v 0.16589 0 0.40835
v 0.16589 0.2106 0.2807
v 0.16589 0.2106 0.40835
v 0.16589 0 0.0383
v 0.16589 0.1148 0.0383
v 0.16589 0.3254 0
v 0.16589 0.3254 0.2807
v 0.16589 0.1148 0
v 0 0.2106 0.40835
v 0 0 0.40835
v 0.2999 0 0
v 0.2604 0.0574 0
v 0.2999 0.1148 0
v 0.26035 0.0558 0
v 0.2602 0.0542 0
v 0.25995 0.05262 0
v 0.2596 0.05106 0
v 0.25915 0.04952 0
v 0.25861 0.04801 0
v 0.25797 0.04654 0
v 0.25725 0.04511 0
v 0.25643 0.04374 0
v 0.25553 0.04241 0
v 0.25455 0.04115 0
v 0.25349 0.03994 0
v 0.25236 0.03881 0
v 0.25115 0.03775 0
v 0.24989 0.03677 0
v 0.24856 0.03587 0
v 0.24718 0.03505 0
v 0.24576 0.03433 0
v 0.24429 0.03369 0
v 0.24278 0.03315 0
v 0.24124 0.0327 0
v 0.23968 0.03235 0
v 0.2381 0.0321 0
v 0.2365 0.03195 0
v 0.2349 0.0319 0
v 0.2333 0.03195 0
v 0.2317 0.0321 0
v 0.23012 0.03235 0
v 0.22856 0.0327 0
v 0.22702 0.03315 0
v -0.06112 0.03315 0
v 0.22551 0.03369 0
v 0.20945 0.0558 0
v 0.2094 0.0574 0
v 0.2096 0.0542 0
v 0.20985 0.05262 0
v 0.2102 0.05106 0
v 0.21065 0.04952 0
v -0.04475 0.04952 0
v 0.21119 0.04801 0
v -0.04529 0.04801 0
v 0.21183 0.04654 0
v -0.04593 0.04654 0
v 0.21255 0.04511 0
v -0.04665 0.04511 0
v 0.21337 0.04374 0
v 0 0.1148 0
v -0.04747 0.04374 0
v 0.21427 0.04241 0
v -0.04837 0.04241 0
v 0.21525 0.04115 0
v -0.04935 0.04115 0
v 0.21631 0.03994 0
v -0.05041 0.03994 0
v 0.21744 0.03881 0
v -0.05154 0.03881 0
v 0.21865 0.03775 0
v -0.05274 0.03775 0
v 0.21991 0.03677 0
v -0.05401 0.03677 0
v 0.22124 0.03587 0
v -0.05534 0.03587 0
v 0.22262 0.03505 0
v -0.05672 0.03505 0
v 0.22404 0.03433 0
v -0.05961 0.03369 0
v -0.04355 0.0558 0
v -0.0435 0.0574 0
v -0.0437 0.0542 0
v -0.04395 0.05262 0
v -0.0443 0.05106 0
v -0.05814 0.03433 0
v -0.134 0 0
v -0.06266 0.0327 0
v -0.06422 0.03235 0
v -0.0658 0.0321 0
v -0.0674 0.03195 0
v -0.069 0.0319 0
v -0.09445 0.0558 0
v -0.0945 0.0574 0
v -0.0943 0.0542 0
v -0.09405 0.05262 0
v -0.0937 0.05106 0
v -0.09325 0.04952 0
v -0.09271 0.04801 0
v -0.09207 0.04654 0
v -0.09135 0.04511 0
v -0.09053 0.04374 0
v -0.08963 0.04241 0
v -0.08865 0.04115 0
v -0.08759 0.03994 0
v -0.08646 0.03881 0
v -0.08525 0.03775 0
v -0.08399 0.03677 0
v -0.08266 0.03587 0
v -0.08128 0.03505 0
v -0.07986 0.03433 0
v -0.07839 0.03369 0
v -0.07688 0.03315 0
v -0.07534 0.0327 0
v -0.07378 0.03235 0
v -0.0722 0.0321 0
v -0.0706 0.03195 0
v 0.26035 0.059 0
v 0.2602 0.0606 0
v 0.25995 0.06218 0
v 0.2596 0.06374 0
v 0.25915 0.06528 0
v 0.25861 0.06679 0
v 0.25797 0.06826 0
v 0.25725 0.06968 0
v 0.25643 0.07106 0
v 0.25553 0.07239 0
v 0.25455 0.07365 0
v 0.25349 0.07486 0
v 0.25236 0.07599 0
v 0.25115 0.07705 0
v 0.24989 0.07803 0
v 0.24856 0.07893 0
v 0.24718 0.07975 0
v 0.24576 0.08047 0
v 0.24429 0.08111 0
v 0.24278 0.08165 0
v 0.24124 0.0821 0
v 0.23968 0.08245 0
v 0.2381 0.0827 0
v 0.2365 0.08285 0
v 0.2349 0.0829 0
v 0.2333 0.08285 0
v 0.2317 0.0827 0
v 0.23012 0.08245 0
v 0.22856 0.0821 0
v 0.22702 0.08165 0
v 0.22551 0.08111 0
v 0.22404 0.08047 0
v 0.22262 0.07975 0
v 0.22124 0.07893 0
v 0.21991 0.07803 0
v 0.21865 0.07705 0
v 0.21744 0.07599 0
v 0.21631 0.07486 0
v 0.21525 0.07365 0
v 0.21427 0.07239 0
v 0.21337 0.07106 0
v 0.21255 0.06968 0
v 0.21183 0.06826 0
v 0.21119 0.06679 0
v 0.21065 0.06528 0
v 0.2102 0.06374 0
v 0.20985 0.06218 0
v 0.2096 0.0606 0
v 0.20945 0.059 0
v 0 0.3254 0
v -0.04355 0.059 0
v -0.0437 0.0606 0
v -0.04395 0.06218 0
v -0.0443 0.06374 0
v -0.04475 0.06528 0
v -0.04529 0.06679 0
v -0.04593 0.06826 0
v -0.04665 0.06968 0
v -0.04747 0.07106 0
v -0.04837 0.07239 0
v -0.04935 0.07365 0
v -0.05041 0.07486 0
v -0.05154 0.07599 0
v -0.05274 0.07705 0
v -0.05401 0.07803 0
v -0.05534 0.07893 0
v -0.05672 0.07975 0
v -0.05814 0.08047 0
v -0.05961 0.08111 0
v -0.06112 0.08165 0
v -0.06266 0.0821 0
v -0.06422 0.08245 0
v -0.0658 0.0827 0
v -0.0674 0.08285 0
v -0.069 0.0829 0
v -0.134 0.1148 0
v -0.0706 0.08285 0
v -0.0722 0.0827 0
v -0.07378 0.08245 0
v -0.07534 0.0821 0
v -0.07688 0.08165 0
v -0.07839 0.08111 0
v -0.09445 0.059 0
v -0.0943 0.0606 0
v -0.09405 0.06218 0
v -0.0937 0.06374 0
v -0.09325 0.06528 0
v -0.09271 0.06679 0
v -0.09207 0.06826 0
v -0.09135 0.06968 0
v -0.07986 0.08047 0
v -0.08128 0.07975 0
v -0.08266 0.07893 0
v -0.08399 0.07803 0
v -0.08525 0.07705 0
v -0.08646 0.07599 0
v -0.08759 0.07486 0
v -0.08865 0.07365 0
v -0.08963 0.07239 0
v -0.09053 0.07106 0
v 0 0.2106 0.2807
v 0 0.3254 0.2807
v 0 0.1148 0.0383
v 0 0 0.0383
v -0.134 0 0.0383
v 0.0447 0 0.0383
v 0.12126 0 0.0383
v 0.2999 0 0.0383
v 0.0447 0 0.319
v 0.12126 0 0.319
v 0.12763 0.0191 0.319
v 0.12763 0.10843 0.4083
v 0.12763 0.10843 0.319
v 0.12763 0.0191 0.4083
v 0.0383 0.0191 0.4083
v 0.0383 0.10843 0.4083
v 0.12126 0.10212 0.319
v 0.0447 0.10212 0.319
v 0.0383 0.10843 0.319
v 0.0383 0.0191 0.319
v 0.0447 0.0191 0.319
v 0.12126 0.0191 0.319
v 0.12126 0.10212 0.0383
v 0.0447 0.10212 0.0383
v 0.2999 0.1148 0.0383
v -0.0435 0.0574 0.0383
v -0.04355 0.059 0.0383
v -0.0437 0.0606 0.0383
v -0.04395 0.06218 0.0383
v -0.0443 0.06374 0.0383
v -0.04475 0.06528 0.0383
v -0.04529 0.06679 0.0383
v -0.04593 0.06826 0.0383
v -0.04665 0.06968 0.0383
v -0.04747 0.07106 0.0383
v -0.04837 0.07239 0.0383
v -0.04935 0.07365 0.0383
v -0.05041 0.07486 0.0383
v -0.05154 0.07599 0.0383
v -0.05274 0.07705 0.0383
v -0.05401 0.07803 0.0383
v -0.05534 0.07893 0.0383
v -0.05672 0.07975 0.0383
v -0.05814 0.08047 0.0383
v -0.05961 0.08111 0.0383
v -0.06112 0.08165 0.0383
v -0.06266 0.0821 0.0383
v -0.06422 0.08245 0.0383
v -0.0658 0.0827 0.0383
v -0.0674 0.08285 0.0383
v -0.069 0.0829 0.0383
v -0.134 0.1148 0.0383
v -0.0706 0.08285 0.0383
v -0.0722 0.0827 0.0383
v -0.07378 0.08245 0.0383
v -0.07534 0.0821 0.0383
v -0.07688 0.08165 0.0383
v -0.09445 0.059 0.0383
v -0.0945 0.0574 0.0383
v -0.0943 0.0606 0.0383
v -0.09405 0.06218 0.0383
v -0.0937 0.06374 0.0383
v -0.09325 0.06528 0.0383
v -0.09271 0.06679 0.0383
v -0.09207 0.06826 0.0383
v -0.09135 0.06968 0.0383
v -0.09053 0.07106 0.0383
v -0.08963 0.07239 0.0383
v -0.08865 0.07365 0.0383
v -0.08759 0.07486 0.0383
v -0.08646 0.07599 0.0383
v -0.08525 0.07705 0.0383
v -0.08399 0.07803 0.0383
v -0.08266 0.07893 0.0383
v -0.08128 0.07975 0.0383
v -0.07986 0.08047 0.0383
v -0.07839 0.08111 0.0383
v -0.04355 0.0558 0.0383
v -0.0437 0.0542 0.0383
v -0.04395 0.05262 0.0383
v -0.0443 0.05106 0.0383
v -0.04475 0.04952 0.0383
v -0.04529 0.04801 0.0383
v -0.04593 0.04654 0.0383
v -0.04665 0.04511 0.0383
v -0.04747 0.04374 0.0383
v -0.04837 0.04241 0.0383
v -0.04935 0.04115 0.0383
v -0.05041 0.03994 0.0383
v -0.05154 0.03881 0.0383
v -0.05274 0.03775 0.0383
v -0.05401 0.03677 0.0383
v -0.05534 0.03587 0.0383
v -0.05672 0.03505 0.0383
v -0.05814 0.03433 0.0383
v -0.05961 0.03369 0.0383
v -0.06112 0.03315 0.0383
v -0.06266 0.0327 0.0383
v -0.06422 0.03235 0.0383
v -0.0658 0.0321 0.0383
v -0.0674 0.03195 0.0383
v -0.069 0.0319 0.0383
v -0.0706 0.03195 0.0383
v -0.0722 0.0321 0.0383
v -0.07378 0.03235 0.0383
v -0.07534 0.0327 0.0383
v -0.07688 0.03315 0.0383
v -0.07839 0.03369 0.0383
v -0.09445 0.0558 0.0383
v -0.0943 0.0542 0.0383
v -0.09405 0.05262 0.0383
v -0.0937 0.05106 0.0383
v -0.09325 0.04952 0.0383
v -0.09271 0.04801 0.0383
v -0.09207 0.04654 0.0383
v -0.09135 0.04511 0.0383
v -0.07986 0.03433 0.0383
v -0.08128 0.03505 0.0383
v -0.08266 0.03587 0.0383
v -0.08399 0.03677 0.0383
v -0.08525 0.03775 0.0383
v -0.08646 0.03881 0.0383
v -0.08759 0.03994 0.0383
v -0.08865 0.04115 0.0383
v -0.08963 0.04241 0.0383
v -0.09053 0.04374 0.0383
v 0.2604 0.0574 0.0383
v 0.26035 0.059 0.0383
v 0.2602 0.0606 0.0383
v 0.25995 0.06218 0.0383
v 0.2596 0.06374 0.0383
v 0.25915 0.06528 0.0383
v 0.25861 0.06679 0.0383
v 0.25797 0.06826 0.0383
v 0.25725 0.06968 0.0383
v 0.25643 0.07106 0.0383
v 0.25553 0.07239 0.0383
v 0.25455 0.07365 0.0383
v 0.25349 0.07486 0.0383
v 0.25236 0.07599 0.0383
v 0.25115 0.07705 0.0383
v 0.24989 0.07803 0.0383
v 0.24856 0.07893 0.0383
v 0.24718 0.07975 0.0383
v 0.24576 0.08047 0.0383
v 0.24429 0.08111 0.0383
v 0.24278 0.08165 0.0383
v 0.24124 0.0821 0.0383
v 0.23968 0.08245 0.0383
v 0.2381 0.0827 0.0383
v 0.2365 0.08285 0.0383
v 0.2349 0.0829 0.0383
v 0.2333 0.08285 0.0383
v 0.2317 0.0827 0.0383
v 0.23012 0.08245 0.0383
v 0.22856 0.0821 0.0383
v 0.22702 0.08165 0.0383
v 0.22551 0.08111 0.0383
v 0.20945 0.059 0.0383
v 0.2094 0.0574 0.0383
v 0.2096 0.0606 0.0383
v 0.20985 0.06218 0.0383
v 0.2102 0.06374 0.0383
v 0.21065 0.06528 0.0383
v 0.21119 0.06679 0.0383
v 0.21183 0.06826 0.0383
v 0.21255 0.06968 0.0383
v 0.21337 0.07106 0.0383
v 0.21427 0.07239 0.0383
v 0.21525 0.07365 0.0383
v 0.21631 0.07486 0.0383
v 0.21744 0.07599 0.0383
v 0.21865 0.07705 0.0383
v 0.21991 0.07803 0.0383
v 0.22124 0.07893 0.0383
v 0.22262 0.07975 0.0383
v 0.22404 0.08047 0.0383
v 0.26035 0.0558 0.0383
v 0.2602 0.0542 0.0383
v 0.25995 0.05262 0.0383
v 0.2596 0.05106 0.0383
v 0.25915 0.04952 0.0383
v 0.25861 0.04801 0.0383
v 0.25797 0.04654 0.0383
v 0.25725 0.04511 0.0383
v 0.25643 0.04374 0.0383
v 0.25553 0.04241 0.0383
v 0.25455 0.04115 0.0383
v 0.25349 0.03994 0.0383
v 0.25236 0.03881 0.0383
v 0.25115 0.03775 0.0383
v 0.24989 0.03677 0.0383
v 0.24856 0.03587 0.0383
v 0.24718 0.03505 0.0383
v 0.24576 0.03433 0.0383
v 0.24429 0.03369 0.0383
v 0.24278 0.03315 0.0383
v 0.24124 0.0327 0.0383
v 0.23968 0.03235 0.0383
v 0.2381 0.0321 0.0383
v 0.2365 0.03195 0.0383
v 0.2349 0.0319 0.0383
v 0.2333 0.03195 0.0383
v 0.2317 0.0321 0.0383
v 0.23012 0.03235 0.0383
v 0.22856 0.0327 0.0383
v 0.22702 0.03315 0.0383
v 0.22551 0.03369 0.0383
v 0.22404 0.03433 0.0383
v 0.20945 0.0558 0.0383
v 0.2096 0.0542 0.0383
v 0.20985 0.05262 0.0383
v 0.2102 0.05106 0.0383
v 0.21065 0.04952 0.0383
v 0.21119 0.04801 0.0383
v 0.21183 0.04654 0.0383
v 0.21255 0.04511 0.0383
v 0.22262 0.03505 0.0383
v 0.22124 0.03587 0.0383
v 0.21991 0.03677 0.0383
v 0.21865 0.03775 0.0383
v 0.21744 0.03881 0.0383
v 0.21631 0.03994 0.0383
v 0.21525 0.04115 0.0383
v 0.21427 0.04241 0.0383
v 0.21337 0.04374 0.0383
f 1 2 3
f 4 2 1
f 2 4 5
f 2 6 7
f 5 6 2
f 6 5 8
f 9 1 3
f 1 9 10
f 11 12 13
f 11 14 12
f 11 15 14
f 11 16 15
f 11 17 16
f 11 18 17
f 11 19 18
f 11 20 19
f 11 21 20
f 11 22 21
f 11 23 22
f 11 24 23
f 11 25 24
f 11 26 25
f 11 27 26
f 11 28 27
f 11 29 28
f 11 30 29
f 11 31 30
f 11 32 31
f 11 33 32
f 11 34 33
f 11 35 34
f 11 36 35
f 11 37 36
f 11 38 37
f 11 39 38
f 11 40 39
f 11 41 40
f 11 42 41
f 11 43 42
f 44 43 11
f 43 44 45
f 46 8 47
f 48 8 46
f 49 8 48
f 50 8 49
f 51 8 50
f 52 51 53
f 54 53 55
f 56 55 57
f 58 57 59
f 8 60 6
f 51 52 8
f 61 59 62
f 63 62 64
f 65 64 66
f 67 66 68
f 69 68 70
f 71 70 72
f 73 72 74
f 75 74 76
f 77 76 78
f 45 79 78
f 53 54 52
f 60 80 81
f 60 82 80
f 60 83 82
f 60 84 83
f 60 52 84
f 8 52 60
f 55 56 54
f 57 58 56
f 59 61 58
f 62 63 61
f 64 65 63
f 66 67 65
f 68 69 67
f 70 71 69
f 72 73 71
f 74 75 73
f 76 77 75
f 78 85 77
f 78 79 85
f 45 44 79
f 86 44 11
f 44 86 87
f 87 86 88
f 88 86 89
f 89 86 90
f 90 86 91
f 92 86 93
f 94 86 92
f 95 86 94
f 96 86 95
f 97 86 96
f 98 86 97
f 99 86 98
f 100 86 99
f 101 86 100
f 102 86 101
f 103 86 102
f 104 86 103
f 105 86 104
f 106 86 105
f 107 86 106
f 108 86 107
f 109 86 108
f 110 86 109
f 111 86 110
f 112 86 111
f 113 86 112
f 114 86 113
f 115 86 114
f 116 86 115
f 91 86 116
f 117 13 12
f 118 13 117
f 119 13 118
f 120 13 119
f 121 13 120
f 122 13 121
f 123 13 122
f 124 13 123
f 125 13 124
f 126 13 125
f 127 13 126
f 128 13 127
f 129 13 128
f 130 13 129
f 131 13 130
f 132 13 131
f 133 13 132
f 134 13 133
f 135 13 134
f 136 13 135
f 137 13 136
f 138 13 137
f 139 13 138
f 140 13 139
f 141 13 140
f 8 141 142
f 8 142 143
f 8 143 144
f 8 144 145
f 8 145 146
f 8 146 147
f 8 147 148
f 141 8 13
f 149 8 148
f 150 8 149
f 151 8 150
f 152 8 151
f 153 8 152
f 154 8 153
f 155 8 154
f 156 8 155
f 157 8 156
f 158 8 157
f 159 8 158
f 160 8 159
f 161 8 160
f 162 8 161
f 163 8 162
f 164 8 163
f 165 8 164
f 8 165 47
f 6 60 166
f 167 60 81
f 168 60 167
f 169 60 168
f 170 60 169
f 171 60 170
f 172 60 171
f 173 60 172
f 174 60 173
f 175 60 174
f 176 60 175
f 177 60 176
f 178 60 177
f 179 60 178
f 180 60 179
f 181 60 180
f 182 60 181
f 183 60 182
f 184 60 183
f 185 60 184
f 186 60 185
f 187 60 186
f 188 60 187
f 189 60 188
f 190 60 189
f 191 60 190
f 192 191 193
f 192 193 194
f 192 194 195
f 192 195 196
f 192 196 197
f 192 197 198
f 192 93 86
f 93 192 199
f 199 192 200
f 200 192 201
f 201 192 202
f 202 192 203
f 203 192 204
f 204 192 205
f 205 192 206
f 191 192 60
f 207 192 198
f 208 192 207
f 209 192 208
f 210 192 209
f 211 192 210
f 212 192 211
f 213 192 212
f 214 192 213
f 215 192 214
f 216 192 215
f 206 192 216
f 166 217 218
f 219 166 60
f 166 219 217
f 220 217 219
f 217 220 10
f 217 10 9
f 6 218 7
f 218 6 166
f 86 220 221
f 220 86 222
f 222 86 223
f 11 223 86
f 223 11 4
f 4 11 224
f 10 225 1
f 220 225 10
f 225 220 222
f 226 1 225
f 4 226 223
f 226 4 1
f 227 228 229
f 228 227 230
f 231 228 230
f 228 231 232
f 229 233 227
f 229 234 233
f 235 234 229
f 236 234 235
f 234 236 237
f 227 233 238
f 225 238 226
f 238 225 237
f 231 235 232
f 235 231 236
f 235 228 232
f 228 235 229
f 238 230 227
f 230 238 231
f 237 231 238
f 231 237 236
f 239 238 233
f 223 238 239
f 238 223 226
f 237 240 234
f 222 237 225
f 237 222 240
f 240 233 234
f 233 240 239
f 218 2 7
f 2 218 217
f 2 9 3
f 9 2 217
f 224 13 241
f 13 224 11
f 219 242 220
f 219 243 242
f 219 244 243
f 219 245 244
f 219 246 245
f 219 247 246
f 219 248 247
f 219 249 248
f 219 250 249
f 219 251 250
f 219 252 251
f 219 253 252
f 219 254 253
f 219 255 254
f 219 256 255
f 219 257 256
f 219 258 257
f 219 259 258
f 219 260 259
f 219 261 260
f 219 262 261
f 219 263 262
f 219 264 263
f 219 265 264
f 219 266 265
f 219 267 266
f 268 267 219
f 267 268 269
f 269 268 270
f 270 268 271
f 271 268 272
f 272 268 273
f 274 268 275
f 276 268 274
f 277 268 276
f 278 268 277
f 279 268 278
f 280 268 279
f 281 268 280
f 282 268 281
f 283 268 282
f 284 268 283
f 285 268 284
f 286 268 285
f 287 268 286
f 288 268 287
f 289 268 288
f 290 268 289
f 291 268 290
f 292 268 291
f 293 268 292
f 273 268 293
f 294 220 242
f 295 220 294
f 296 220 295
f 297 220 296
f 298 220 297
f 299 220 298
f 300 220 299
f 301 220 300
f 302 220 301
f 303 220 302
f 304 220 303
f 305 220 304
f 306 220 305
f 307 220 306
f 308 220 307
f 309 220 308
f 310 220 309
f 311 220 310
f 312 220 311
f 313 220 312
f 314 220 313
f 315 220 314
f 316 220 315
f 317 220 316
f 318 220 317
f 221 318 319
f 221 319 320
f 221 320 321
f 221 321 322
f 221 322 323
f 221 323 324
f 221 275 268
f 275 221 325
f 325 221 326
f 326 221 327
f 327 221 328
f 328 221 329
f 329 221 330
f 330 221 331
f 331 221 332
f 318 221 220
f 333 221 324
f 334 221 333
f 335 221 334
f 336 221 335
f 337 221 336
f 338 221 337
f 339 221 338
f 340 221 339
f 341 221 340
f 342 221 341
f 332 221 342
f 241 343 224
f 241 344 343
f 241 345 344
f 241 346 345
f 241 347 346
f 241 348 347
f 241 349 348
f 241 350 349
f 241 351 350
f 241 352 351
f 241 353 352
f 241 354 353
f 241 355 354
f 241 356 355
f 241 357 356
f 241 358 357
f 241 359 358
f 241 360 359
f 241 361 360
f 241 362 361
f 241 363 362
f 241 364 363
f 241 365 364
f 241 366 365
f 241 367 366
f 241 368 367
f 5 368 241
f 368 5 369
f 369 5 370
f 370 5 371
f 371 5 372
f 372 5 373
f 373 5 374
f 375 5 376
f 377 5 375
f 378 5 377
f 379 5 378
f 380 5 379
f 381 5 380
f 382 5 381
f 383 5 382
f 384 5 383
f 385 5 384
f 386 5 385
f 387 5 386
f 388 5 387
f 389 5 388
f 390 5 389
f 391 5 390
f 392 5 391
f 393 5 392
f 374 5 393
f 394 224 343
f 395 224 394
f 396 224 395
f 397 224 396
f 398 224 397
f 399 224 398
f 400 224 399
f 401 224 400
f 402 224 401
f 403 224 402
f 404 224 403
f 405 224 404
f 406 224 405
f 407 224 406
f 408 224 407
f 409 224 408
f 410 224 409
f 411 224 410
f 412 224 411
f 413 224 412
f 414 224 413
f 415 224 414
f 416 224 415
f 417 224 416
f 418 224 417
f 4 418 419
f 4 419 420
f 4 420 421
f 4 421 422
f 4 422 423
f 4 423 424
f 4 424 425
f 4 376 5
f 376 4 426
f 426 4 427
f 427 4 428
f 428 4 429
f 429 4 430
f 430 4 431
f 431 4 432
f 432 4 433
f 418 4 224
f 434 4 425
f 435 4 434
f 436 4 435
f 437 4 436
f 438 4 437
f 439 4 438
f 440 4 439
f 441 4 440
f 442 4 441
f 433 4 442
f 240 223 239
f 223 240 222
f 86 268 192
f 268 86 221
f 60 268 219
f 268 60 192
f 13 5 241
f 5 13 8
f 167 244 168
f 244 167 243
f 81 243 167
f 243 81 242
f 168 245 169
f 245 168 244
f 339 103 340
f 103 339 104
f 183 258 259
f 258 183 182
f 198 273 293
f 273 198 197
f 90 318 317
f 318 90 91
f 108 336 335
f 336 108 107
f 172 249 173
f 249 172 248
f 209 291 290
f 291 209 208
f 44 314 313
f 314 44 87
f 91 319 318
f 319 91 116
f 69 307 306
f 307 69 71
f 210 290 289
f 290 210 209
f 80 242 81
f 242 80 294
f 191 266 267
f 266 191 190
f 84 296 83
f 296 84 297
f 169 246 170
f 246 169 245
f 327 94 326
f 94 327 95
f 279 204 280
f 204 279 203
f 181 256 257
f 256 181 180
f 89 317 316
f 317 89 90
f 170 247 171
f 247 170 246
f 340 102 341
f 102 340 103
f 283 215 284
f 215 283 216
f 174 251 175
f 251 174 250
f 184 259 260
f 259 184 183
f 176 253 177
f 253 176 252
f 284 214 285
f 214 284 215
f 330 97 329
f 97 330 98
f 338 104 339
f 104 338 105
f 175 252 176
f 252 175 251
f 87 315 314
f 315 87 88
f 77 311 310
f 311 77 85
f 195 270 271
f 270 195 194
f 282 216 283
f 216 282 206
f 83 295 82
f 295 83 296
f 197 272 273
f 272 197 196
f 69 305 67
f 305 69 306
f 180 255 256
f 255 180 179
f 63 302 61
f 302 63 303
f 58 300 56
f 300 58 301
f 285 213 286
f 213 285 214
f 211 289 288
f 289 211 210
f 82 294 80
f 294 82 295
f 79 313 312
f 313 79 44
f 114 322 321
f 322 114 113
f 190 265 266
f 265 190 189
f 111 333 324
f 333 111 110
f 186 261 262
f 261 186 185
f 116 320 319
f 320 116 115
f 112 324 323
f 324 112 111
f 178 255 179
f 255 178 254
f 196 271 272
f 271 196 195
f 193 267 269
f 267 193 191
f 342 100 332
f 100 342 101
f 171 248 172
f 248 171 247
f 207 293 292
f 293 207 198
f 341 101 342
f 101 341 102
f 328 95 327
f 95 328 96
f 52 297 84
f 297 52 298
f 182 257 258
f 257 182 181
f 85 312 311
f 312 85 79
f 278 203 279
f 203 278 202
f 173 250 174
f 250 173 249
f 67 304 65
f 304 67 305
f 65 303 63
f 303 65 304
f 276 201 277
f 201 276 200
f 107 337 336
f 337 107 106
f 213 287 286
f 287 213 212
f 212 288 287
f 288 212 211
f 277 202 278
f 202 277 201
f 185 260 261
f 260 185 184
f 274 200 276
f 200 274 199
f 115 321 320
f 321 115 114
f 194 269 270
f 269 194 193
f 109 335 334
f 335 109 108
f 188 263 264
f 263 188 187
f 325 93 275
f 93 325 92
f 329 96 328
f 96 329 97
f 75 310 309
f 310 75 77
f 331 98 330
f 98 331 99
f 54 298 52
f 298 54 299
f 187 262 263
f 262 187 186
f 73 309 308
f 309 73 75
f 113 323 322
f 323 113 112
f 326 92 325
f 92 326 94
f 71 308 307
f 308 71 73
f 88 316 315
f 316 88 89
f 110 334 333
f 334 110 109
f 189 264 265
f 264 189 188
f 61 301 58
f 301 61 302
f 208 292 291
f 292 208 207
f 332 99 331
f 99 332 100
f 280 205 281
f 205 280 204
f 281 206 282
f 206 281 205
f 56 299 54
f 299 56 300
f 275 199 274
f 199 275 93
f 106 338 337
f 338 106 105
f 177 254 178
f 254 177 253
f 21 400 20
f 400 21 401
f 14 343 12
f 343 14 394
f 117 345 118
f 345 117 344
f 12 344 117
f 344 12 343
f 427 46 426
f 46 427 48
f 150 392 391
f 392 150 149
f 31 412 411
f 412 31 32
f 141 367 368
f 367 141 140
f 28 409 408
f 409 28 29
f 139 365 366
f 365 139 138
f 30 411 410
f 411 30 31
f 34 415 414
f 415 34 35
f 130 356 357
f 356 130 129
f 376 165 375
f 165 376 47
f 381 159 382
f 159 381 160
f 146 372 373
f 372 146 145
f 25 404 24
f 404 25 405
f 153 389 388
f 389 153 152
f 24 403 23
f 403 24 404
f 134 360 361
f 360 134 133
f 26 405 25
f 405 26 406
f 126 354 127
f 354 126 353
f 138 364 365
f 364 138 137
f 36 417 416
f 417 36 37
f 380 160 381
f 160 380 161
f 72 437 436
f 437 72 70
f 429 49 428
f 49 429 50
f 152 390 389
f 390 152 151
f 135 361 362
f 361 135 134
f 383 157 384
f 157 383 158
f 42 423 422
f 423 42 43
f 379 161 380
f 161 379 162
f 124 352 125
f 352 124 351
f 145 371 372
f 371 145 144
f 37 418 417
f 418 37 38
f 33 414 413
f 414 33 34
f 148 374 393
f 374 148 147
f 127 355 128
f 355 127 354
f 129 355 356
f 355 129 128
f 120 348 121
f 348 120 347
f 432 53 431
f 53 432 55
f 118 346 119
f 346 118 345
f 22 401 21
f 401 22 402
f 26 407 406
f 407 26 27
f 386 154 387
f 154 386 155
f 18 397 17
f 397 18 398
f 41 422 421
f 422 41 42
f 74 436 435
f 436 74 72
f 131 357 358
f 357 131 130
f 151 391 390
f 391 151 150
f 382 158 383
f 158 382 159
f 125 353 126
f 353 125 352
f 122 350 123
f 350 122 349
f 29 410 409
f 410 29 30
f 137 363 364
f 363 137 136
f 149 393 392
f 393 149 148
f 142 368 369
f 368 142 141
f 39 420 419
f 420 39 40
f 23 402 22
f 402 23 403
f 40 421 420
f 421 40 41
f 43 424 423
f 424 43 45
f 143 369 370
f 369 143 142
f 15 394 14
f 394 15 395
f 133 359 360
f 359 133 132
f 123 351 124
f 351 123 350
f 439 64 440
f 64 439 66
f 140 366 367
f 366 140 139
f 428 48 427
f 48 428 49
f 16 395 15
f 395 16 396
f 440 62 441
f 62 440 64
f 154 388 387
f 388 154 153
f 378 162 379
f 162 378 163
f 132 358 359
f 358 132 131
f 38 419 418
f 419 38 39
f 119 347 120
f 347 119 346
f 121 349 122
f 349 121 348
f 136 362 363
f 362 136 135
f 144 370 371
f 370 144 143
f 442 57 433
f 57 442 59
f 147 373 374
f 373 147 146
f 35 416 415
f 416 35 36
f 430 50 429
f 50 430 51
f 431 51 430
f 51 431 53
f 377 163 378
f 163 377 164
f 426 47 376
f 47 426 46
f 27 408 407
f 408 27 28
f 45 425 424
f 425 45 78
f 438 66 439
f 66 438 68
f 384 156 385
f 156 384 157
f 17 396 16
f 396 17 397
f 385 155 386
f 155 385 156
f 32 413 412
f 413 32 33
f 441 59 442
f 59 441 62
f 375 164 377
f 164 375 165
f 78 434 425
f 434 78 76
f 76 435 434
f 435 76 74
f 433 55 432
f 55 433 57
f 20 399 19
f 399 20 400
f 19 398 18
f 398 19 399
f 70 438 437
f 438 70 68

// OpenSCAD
// Parametric model of a machined part with base, recesses, step, and extension with holes

// Main base dimensions
base_length = 0.165891;  // X
base_width = 0.325401;   // Y
base_height = 0.408347;  // Z

// Square recess from top
recess_x = 0.089326;
recess_y = 0.089326;
recess_z = 0.0893;            // depth = 0.4083 - 0.319
recess_z_min = 0.319;
recess_x_offset = 0.0383;     // from left edge
recess_y_front = 0.0191;      // from front edge

// Lower rectangular opening (cuts through up to recess floor)
low_x = 0.076565;
low_y = 0.132416;
low_z = 0.319;                // 0 to 0.319
low_x_offset_left = 0.0447;
low_y_front = -0.0303;        // breaks out beyond front face

// Upper back strip removal (step)
back_strip_y = 0.114848;      // Y width of the strip
back_strip_y_start = 0.2106;  // front of strip
back_strip_z_min = 0.2807;    // from this height to top
back_strip_z = base_height - back_strip_z_min;  // 0.1276

// Shallow base extension (front, wider)
ext_z = 0.0383;
ext_x = 0.4339;
ext_y = 0.1148;
ext_x_min = -0.134;           // extends left of base
ext_y_min = 0;                // frontmost

// Through holes in the extension
hole_radius = 0.0255;
hole_y = 0.0574;              // front offset line
hole1_x = -0.069;             // relative to base left edge (X=0)
hole2_x = 0.2349;

$fn = 100; // smooth circles

difference() {
    union() {
        // Main base with three cutouts
        difference() {
            cube([base_length, base_width, base_height]);
            // square recess at top
            translate([recess_x_offset, recess_y_front, recess_z_min])
                cube([recess_x, recess_y, recess_z]);
            // lower rectangular opening
            translate([low_x_offset_left, low_y_front, 0])
                cube([low_x, low_y, low_z]);
            // upper back strip
            translate([0, back_strip_y_start, back_strip_z_min])
                cube([base_length, back_strip_y, back_strip_z]);
        }
        // shallow front extension
        translate([ext_x_min, ext_y_min, 0])
            cube([ext_x, ext_y, ext_z]);
    }
    // two through holes in the extension (clean cut)
    translate([hole1_x, hole_y, -0.01])
        cylinder(h = ext_z + 0.02, r = hole_radius);
    translate([hole2_x, hole_y, -0.01])
        cylinder(h = ext_z + 0.02, r = hole_radius);
}
